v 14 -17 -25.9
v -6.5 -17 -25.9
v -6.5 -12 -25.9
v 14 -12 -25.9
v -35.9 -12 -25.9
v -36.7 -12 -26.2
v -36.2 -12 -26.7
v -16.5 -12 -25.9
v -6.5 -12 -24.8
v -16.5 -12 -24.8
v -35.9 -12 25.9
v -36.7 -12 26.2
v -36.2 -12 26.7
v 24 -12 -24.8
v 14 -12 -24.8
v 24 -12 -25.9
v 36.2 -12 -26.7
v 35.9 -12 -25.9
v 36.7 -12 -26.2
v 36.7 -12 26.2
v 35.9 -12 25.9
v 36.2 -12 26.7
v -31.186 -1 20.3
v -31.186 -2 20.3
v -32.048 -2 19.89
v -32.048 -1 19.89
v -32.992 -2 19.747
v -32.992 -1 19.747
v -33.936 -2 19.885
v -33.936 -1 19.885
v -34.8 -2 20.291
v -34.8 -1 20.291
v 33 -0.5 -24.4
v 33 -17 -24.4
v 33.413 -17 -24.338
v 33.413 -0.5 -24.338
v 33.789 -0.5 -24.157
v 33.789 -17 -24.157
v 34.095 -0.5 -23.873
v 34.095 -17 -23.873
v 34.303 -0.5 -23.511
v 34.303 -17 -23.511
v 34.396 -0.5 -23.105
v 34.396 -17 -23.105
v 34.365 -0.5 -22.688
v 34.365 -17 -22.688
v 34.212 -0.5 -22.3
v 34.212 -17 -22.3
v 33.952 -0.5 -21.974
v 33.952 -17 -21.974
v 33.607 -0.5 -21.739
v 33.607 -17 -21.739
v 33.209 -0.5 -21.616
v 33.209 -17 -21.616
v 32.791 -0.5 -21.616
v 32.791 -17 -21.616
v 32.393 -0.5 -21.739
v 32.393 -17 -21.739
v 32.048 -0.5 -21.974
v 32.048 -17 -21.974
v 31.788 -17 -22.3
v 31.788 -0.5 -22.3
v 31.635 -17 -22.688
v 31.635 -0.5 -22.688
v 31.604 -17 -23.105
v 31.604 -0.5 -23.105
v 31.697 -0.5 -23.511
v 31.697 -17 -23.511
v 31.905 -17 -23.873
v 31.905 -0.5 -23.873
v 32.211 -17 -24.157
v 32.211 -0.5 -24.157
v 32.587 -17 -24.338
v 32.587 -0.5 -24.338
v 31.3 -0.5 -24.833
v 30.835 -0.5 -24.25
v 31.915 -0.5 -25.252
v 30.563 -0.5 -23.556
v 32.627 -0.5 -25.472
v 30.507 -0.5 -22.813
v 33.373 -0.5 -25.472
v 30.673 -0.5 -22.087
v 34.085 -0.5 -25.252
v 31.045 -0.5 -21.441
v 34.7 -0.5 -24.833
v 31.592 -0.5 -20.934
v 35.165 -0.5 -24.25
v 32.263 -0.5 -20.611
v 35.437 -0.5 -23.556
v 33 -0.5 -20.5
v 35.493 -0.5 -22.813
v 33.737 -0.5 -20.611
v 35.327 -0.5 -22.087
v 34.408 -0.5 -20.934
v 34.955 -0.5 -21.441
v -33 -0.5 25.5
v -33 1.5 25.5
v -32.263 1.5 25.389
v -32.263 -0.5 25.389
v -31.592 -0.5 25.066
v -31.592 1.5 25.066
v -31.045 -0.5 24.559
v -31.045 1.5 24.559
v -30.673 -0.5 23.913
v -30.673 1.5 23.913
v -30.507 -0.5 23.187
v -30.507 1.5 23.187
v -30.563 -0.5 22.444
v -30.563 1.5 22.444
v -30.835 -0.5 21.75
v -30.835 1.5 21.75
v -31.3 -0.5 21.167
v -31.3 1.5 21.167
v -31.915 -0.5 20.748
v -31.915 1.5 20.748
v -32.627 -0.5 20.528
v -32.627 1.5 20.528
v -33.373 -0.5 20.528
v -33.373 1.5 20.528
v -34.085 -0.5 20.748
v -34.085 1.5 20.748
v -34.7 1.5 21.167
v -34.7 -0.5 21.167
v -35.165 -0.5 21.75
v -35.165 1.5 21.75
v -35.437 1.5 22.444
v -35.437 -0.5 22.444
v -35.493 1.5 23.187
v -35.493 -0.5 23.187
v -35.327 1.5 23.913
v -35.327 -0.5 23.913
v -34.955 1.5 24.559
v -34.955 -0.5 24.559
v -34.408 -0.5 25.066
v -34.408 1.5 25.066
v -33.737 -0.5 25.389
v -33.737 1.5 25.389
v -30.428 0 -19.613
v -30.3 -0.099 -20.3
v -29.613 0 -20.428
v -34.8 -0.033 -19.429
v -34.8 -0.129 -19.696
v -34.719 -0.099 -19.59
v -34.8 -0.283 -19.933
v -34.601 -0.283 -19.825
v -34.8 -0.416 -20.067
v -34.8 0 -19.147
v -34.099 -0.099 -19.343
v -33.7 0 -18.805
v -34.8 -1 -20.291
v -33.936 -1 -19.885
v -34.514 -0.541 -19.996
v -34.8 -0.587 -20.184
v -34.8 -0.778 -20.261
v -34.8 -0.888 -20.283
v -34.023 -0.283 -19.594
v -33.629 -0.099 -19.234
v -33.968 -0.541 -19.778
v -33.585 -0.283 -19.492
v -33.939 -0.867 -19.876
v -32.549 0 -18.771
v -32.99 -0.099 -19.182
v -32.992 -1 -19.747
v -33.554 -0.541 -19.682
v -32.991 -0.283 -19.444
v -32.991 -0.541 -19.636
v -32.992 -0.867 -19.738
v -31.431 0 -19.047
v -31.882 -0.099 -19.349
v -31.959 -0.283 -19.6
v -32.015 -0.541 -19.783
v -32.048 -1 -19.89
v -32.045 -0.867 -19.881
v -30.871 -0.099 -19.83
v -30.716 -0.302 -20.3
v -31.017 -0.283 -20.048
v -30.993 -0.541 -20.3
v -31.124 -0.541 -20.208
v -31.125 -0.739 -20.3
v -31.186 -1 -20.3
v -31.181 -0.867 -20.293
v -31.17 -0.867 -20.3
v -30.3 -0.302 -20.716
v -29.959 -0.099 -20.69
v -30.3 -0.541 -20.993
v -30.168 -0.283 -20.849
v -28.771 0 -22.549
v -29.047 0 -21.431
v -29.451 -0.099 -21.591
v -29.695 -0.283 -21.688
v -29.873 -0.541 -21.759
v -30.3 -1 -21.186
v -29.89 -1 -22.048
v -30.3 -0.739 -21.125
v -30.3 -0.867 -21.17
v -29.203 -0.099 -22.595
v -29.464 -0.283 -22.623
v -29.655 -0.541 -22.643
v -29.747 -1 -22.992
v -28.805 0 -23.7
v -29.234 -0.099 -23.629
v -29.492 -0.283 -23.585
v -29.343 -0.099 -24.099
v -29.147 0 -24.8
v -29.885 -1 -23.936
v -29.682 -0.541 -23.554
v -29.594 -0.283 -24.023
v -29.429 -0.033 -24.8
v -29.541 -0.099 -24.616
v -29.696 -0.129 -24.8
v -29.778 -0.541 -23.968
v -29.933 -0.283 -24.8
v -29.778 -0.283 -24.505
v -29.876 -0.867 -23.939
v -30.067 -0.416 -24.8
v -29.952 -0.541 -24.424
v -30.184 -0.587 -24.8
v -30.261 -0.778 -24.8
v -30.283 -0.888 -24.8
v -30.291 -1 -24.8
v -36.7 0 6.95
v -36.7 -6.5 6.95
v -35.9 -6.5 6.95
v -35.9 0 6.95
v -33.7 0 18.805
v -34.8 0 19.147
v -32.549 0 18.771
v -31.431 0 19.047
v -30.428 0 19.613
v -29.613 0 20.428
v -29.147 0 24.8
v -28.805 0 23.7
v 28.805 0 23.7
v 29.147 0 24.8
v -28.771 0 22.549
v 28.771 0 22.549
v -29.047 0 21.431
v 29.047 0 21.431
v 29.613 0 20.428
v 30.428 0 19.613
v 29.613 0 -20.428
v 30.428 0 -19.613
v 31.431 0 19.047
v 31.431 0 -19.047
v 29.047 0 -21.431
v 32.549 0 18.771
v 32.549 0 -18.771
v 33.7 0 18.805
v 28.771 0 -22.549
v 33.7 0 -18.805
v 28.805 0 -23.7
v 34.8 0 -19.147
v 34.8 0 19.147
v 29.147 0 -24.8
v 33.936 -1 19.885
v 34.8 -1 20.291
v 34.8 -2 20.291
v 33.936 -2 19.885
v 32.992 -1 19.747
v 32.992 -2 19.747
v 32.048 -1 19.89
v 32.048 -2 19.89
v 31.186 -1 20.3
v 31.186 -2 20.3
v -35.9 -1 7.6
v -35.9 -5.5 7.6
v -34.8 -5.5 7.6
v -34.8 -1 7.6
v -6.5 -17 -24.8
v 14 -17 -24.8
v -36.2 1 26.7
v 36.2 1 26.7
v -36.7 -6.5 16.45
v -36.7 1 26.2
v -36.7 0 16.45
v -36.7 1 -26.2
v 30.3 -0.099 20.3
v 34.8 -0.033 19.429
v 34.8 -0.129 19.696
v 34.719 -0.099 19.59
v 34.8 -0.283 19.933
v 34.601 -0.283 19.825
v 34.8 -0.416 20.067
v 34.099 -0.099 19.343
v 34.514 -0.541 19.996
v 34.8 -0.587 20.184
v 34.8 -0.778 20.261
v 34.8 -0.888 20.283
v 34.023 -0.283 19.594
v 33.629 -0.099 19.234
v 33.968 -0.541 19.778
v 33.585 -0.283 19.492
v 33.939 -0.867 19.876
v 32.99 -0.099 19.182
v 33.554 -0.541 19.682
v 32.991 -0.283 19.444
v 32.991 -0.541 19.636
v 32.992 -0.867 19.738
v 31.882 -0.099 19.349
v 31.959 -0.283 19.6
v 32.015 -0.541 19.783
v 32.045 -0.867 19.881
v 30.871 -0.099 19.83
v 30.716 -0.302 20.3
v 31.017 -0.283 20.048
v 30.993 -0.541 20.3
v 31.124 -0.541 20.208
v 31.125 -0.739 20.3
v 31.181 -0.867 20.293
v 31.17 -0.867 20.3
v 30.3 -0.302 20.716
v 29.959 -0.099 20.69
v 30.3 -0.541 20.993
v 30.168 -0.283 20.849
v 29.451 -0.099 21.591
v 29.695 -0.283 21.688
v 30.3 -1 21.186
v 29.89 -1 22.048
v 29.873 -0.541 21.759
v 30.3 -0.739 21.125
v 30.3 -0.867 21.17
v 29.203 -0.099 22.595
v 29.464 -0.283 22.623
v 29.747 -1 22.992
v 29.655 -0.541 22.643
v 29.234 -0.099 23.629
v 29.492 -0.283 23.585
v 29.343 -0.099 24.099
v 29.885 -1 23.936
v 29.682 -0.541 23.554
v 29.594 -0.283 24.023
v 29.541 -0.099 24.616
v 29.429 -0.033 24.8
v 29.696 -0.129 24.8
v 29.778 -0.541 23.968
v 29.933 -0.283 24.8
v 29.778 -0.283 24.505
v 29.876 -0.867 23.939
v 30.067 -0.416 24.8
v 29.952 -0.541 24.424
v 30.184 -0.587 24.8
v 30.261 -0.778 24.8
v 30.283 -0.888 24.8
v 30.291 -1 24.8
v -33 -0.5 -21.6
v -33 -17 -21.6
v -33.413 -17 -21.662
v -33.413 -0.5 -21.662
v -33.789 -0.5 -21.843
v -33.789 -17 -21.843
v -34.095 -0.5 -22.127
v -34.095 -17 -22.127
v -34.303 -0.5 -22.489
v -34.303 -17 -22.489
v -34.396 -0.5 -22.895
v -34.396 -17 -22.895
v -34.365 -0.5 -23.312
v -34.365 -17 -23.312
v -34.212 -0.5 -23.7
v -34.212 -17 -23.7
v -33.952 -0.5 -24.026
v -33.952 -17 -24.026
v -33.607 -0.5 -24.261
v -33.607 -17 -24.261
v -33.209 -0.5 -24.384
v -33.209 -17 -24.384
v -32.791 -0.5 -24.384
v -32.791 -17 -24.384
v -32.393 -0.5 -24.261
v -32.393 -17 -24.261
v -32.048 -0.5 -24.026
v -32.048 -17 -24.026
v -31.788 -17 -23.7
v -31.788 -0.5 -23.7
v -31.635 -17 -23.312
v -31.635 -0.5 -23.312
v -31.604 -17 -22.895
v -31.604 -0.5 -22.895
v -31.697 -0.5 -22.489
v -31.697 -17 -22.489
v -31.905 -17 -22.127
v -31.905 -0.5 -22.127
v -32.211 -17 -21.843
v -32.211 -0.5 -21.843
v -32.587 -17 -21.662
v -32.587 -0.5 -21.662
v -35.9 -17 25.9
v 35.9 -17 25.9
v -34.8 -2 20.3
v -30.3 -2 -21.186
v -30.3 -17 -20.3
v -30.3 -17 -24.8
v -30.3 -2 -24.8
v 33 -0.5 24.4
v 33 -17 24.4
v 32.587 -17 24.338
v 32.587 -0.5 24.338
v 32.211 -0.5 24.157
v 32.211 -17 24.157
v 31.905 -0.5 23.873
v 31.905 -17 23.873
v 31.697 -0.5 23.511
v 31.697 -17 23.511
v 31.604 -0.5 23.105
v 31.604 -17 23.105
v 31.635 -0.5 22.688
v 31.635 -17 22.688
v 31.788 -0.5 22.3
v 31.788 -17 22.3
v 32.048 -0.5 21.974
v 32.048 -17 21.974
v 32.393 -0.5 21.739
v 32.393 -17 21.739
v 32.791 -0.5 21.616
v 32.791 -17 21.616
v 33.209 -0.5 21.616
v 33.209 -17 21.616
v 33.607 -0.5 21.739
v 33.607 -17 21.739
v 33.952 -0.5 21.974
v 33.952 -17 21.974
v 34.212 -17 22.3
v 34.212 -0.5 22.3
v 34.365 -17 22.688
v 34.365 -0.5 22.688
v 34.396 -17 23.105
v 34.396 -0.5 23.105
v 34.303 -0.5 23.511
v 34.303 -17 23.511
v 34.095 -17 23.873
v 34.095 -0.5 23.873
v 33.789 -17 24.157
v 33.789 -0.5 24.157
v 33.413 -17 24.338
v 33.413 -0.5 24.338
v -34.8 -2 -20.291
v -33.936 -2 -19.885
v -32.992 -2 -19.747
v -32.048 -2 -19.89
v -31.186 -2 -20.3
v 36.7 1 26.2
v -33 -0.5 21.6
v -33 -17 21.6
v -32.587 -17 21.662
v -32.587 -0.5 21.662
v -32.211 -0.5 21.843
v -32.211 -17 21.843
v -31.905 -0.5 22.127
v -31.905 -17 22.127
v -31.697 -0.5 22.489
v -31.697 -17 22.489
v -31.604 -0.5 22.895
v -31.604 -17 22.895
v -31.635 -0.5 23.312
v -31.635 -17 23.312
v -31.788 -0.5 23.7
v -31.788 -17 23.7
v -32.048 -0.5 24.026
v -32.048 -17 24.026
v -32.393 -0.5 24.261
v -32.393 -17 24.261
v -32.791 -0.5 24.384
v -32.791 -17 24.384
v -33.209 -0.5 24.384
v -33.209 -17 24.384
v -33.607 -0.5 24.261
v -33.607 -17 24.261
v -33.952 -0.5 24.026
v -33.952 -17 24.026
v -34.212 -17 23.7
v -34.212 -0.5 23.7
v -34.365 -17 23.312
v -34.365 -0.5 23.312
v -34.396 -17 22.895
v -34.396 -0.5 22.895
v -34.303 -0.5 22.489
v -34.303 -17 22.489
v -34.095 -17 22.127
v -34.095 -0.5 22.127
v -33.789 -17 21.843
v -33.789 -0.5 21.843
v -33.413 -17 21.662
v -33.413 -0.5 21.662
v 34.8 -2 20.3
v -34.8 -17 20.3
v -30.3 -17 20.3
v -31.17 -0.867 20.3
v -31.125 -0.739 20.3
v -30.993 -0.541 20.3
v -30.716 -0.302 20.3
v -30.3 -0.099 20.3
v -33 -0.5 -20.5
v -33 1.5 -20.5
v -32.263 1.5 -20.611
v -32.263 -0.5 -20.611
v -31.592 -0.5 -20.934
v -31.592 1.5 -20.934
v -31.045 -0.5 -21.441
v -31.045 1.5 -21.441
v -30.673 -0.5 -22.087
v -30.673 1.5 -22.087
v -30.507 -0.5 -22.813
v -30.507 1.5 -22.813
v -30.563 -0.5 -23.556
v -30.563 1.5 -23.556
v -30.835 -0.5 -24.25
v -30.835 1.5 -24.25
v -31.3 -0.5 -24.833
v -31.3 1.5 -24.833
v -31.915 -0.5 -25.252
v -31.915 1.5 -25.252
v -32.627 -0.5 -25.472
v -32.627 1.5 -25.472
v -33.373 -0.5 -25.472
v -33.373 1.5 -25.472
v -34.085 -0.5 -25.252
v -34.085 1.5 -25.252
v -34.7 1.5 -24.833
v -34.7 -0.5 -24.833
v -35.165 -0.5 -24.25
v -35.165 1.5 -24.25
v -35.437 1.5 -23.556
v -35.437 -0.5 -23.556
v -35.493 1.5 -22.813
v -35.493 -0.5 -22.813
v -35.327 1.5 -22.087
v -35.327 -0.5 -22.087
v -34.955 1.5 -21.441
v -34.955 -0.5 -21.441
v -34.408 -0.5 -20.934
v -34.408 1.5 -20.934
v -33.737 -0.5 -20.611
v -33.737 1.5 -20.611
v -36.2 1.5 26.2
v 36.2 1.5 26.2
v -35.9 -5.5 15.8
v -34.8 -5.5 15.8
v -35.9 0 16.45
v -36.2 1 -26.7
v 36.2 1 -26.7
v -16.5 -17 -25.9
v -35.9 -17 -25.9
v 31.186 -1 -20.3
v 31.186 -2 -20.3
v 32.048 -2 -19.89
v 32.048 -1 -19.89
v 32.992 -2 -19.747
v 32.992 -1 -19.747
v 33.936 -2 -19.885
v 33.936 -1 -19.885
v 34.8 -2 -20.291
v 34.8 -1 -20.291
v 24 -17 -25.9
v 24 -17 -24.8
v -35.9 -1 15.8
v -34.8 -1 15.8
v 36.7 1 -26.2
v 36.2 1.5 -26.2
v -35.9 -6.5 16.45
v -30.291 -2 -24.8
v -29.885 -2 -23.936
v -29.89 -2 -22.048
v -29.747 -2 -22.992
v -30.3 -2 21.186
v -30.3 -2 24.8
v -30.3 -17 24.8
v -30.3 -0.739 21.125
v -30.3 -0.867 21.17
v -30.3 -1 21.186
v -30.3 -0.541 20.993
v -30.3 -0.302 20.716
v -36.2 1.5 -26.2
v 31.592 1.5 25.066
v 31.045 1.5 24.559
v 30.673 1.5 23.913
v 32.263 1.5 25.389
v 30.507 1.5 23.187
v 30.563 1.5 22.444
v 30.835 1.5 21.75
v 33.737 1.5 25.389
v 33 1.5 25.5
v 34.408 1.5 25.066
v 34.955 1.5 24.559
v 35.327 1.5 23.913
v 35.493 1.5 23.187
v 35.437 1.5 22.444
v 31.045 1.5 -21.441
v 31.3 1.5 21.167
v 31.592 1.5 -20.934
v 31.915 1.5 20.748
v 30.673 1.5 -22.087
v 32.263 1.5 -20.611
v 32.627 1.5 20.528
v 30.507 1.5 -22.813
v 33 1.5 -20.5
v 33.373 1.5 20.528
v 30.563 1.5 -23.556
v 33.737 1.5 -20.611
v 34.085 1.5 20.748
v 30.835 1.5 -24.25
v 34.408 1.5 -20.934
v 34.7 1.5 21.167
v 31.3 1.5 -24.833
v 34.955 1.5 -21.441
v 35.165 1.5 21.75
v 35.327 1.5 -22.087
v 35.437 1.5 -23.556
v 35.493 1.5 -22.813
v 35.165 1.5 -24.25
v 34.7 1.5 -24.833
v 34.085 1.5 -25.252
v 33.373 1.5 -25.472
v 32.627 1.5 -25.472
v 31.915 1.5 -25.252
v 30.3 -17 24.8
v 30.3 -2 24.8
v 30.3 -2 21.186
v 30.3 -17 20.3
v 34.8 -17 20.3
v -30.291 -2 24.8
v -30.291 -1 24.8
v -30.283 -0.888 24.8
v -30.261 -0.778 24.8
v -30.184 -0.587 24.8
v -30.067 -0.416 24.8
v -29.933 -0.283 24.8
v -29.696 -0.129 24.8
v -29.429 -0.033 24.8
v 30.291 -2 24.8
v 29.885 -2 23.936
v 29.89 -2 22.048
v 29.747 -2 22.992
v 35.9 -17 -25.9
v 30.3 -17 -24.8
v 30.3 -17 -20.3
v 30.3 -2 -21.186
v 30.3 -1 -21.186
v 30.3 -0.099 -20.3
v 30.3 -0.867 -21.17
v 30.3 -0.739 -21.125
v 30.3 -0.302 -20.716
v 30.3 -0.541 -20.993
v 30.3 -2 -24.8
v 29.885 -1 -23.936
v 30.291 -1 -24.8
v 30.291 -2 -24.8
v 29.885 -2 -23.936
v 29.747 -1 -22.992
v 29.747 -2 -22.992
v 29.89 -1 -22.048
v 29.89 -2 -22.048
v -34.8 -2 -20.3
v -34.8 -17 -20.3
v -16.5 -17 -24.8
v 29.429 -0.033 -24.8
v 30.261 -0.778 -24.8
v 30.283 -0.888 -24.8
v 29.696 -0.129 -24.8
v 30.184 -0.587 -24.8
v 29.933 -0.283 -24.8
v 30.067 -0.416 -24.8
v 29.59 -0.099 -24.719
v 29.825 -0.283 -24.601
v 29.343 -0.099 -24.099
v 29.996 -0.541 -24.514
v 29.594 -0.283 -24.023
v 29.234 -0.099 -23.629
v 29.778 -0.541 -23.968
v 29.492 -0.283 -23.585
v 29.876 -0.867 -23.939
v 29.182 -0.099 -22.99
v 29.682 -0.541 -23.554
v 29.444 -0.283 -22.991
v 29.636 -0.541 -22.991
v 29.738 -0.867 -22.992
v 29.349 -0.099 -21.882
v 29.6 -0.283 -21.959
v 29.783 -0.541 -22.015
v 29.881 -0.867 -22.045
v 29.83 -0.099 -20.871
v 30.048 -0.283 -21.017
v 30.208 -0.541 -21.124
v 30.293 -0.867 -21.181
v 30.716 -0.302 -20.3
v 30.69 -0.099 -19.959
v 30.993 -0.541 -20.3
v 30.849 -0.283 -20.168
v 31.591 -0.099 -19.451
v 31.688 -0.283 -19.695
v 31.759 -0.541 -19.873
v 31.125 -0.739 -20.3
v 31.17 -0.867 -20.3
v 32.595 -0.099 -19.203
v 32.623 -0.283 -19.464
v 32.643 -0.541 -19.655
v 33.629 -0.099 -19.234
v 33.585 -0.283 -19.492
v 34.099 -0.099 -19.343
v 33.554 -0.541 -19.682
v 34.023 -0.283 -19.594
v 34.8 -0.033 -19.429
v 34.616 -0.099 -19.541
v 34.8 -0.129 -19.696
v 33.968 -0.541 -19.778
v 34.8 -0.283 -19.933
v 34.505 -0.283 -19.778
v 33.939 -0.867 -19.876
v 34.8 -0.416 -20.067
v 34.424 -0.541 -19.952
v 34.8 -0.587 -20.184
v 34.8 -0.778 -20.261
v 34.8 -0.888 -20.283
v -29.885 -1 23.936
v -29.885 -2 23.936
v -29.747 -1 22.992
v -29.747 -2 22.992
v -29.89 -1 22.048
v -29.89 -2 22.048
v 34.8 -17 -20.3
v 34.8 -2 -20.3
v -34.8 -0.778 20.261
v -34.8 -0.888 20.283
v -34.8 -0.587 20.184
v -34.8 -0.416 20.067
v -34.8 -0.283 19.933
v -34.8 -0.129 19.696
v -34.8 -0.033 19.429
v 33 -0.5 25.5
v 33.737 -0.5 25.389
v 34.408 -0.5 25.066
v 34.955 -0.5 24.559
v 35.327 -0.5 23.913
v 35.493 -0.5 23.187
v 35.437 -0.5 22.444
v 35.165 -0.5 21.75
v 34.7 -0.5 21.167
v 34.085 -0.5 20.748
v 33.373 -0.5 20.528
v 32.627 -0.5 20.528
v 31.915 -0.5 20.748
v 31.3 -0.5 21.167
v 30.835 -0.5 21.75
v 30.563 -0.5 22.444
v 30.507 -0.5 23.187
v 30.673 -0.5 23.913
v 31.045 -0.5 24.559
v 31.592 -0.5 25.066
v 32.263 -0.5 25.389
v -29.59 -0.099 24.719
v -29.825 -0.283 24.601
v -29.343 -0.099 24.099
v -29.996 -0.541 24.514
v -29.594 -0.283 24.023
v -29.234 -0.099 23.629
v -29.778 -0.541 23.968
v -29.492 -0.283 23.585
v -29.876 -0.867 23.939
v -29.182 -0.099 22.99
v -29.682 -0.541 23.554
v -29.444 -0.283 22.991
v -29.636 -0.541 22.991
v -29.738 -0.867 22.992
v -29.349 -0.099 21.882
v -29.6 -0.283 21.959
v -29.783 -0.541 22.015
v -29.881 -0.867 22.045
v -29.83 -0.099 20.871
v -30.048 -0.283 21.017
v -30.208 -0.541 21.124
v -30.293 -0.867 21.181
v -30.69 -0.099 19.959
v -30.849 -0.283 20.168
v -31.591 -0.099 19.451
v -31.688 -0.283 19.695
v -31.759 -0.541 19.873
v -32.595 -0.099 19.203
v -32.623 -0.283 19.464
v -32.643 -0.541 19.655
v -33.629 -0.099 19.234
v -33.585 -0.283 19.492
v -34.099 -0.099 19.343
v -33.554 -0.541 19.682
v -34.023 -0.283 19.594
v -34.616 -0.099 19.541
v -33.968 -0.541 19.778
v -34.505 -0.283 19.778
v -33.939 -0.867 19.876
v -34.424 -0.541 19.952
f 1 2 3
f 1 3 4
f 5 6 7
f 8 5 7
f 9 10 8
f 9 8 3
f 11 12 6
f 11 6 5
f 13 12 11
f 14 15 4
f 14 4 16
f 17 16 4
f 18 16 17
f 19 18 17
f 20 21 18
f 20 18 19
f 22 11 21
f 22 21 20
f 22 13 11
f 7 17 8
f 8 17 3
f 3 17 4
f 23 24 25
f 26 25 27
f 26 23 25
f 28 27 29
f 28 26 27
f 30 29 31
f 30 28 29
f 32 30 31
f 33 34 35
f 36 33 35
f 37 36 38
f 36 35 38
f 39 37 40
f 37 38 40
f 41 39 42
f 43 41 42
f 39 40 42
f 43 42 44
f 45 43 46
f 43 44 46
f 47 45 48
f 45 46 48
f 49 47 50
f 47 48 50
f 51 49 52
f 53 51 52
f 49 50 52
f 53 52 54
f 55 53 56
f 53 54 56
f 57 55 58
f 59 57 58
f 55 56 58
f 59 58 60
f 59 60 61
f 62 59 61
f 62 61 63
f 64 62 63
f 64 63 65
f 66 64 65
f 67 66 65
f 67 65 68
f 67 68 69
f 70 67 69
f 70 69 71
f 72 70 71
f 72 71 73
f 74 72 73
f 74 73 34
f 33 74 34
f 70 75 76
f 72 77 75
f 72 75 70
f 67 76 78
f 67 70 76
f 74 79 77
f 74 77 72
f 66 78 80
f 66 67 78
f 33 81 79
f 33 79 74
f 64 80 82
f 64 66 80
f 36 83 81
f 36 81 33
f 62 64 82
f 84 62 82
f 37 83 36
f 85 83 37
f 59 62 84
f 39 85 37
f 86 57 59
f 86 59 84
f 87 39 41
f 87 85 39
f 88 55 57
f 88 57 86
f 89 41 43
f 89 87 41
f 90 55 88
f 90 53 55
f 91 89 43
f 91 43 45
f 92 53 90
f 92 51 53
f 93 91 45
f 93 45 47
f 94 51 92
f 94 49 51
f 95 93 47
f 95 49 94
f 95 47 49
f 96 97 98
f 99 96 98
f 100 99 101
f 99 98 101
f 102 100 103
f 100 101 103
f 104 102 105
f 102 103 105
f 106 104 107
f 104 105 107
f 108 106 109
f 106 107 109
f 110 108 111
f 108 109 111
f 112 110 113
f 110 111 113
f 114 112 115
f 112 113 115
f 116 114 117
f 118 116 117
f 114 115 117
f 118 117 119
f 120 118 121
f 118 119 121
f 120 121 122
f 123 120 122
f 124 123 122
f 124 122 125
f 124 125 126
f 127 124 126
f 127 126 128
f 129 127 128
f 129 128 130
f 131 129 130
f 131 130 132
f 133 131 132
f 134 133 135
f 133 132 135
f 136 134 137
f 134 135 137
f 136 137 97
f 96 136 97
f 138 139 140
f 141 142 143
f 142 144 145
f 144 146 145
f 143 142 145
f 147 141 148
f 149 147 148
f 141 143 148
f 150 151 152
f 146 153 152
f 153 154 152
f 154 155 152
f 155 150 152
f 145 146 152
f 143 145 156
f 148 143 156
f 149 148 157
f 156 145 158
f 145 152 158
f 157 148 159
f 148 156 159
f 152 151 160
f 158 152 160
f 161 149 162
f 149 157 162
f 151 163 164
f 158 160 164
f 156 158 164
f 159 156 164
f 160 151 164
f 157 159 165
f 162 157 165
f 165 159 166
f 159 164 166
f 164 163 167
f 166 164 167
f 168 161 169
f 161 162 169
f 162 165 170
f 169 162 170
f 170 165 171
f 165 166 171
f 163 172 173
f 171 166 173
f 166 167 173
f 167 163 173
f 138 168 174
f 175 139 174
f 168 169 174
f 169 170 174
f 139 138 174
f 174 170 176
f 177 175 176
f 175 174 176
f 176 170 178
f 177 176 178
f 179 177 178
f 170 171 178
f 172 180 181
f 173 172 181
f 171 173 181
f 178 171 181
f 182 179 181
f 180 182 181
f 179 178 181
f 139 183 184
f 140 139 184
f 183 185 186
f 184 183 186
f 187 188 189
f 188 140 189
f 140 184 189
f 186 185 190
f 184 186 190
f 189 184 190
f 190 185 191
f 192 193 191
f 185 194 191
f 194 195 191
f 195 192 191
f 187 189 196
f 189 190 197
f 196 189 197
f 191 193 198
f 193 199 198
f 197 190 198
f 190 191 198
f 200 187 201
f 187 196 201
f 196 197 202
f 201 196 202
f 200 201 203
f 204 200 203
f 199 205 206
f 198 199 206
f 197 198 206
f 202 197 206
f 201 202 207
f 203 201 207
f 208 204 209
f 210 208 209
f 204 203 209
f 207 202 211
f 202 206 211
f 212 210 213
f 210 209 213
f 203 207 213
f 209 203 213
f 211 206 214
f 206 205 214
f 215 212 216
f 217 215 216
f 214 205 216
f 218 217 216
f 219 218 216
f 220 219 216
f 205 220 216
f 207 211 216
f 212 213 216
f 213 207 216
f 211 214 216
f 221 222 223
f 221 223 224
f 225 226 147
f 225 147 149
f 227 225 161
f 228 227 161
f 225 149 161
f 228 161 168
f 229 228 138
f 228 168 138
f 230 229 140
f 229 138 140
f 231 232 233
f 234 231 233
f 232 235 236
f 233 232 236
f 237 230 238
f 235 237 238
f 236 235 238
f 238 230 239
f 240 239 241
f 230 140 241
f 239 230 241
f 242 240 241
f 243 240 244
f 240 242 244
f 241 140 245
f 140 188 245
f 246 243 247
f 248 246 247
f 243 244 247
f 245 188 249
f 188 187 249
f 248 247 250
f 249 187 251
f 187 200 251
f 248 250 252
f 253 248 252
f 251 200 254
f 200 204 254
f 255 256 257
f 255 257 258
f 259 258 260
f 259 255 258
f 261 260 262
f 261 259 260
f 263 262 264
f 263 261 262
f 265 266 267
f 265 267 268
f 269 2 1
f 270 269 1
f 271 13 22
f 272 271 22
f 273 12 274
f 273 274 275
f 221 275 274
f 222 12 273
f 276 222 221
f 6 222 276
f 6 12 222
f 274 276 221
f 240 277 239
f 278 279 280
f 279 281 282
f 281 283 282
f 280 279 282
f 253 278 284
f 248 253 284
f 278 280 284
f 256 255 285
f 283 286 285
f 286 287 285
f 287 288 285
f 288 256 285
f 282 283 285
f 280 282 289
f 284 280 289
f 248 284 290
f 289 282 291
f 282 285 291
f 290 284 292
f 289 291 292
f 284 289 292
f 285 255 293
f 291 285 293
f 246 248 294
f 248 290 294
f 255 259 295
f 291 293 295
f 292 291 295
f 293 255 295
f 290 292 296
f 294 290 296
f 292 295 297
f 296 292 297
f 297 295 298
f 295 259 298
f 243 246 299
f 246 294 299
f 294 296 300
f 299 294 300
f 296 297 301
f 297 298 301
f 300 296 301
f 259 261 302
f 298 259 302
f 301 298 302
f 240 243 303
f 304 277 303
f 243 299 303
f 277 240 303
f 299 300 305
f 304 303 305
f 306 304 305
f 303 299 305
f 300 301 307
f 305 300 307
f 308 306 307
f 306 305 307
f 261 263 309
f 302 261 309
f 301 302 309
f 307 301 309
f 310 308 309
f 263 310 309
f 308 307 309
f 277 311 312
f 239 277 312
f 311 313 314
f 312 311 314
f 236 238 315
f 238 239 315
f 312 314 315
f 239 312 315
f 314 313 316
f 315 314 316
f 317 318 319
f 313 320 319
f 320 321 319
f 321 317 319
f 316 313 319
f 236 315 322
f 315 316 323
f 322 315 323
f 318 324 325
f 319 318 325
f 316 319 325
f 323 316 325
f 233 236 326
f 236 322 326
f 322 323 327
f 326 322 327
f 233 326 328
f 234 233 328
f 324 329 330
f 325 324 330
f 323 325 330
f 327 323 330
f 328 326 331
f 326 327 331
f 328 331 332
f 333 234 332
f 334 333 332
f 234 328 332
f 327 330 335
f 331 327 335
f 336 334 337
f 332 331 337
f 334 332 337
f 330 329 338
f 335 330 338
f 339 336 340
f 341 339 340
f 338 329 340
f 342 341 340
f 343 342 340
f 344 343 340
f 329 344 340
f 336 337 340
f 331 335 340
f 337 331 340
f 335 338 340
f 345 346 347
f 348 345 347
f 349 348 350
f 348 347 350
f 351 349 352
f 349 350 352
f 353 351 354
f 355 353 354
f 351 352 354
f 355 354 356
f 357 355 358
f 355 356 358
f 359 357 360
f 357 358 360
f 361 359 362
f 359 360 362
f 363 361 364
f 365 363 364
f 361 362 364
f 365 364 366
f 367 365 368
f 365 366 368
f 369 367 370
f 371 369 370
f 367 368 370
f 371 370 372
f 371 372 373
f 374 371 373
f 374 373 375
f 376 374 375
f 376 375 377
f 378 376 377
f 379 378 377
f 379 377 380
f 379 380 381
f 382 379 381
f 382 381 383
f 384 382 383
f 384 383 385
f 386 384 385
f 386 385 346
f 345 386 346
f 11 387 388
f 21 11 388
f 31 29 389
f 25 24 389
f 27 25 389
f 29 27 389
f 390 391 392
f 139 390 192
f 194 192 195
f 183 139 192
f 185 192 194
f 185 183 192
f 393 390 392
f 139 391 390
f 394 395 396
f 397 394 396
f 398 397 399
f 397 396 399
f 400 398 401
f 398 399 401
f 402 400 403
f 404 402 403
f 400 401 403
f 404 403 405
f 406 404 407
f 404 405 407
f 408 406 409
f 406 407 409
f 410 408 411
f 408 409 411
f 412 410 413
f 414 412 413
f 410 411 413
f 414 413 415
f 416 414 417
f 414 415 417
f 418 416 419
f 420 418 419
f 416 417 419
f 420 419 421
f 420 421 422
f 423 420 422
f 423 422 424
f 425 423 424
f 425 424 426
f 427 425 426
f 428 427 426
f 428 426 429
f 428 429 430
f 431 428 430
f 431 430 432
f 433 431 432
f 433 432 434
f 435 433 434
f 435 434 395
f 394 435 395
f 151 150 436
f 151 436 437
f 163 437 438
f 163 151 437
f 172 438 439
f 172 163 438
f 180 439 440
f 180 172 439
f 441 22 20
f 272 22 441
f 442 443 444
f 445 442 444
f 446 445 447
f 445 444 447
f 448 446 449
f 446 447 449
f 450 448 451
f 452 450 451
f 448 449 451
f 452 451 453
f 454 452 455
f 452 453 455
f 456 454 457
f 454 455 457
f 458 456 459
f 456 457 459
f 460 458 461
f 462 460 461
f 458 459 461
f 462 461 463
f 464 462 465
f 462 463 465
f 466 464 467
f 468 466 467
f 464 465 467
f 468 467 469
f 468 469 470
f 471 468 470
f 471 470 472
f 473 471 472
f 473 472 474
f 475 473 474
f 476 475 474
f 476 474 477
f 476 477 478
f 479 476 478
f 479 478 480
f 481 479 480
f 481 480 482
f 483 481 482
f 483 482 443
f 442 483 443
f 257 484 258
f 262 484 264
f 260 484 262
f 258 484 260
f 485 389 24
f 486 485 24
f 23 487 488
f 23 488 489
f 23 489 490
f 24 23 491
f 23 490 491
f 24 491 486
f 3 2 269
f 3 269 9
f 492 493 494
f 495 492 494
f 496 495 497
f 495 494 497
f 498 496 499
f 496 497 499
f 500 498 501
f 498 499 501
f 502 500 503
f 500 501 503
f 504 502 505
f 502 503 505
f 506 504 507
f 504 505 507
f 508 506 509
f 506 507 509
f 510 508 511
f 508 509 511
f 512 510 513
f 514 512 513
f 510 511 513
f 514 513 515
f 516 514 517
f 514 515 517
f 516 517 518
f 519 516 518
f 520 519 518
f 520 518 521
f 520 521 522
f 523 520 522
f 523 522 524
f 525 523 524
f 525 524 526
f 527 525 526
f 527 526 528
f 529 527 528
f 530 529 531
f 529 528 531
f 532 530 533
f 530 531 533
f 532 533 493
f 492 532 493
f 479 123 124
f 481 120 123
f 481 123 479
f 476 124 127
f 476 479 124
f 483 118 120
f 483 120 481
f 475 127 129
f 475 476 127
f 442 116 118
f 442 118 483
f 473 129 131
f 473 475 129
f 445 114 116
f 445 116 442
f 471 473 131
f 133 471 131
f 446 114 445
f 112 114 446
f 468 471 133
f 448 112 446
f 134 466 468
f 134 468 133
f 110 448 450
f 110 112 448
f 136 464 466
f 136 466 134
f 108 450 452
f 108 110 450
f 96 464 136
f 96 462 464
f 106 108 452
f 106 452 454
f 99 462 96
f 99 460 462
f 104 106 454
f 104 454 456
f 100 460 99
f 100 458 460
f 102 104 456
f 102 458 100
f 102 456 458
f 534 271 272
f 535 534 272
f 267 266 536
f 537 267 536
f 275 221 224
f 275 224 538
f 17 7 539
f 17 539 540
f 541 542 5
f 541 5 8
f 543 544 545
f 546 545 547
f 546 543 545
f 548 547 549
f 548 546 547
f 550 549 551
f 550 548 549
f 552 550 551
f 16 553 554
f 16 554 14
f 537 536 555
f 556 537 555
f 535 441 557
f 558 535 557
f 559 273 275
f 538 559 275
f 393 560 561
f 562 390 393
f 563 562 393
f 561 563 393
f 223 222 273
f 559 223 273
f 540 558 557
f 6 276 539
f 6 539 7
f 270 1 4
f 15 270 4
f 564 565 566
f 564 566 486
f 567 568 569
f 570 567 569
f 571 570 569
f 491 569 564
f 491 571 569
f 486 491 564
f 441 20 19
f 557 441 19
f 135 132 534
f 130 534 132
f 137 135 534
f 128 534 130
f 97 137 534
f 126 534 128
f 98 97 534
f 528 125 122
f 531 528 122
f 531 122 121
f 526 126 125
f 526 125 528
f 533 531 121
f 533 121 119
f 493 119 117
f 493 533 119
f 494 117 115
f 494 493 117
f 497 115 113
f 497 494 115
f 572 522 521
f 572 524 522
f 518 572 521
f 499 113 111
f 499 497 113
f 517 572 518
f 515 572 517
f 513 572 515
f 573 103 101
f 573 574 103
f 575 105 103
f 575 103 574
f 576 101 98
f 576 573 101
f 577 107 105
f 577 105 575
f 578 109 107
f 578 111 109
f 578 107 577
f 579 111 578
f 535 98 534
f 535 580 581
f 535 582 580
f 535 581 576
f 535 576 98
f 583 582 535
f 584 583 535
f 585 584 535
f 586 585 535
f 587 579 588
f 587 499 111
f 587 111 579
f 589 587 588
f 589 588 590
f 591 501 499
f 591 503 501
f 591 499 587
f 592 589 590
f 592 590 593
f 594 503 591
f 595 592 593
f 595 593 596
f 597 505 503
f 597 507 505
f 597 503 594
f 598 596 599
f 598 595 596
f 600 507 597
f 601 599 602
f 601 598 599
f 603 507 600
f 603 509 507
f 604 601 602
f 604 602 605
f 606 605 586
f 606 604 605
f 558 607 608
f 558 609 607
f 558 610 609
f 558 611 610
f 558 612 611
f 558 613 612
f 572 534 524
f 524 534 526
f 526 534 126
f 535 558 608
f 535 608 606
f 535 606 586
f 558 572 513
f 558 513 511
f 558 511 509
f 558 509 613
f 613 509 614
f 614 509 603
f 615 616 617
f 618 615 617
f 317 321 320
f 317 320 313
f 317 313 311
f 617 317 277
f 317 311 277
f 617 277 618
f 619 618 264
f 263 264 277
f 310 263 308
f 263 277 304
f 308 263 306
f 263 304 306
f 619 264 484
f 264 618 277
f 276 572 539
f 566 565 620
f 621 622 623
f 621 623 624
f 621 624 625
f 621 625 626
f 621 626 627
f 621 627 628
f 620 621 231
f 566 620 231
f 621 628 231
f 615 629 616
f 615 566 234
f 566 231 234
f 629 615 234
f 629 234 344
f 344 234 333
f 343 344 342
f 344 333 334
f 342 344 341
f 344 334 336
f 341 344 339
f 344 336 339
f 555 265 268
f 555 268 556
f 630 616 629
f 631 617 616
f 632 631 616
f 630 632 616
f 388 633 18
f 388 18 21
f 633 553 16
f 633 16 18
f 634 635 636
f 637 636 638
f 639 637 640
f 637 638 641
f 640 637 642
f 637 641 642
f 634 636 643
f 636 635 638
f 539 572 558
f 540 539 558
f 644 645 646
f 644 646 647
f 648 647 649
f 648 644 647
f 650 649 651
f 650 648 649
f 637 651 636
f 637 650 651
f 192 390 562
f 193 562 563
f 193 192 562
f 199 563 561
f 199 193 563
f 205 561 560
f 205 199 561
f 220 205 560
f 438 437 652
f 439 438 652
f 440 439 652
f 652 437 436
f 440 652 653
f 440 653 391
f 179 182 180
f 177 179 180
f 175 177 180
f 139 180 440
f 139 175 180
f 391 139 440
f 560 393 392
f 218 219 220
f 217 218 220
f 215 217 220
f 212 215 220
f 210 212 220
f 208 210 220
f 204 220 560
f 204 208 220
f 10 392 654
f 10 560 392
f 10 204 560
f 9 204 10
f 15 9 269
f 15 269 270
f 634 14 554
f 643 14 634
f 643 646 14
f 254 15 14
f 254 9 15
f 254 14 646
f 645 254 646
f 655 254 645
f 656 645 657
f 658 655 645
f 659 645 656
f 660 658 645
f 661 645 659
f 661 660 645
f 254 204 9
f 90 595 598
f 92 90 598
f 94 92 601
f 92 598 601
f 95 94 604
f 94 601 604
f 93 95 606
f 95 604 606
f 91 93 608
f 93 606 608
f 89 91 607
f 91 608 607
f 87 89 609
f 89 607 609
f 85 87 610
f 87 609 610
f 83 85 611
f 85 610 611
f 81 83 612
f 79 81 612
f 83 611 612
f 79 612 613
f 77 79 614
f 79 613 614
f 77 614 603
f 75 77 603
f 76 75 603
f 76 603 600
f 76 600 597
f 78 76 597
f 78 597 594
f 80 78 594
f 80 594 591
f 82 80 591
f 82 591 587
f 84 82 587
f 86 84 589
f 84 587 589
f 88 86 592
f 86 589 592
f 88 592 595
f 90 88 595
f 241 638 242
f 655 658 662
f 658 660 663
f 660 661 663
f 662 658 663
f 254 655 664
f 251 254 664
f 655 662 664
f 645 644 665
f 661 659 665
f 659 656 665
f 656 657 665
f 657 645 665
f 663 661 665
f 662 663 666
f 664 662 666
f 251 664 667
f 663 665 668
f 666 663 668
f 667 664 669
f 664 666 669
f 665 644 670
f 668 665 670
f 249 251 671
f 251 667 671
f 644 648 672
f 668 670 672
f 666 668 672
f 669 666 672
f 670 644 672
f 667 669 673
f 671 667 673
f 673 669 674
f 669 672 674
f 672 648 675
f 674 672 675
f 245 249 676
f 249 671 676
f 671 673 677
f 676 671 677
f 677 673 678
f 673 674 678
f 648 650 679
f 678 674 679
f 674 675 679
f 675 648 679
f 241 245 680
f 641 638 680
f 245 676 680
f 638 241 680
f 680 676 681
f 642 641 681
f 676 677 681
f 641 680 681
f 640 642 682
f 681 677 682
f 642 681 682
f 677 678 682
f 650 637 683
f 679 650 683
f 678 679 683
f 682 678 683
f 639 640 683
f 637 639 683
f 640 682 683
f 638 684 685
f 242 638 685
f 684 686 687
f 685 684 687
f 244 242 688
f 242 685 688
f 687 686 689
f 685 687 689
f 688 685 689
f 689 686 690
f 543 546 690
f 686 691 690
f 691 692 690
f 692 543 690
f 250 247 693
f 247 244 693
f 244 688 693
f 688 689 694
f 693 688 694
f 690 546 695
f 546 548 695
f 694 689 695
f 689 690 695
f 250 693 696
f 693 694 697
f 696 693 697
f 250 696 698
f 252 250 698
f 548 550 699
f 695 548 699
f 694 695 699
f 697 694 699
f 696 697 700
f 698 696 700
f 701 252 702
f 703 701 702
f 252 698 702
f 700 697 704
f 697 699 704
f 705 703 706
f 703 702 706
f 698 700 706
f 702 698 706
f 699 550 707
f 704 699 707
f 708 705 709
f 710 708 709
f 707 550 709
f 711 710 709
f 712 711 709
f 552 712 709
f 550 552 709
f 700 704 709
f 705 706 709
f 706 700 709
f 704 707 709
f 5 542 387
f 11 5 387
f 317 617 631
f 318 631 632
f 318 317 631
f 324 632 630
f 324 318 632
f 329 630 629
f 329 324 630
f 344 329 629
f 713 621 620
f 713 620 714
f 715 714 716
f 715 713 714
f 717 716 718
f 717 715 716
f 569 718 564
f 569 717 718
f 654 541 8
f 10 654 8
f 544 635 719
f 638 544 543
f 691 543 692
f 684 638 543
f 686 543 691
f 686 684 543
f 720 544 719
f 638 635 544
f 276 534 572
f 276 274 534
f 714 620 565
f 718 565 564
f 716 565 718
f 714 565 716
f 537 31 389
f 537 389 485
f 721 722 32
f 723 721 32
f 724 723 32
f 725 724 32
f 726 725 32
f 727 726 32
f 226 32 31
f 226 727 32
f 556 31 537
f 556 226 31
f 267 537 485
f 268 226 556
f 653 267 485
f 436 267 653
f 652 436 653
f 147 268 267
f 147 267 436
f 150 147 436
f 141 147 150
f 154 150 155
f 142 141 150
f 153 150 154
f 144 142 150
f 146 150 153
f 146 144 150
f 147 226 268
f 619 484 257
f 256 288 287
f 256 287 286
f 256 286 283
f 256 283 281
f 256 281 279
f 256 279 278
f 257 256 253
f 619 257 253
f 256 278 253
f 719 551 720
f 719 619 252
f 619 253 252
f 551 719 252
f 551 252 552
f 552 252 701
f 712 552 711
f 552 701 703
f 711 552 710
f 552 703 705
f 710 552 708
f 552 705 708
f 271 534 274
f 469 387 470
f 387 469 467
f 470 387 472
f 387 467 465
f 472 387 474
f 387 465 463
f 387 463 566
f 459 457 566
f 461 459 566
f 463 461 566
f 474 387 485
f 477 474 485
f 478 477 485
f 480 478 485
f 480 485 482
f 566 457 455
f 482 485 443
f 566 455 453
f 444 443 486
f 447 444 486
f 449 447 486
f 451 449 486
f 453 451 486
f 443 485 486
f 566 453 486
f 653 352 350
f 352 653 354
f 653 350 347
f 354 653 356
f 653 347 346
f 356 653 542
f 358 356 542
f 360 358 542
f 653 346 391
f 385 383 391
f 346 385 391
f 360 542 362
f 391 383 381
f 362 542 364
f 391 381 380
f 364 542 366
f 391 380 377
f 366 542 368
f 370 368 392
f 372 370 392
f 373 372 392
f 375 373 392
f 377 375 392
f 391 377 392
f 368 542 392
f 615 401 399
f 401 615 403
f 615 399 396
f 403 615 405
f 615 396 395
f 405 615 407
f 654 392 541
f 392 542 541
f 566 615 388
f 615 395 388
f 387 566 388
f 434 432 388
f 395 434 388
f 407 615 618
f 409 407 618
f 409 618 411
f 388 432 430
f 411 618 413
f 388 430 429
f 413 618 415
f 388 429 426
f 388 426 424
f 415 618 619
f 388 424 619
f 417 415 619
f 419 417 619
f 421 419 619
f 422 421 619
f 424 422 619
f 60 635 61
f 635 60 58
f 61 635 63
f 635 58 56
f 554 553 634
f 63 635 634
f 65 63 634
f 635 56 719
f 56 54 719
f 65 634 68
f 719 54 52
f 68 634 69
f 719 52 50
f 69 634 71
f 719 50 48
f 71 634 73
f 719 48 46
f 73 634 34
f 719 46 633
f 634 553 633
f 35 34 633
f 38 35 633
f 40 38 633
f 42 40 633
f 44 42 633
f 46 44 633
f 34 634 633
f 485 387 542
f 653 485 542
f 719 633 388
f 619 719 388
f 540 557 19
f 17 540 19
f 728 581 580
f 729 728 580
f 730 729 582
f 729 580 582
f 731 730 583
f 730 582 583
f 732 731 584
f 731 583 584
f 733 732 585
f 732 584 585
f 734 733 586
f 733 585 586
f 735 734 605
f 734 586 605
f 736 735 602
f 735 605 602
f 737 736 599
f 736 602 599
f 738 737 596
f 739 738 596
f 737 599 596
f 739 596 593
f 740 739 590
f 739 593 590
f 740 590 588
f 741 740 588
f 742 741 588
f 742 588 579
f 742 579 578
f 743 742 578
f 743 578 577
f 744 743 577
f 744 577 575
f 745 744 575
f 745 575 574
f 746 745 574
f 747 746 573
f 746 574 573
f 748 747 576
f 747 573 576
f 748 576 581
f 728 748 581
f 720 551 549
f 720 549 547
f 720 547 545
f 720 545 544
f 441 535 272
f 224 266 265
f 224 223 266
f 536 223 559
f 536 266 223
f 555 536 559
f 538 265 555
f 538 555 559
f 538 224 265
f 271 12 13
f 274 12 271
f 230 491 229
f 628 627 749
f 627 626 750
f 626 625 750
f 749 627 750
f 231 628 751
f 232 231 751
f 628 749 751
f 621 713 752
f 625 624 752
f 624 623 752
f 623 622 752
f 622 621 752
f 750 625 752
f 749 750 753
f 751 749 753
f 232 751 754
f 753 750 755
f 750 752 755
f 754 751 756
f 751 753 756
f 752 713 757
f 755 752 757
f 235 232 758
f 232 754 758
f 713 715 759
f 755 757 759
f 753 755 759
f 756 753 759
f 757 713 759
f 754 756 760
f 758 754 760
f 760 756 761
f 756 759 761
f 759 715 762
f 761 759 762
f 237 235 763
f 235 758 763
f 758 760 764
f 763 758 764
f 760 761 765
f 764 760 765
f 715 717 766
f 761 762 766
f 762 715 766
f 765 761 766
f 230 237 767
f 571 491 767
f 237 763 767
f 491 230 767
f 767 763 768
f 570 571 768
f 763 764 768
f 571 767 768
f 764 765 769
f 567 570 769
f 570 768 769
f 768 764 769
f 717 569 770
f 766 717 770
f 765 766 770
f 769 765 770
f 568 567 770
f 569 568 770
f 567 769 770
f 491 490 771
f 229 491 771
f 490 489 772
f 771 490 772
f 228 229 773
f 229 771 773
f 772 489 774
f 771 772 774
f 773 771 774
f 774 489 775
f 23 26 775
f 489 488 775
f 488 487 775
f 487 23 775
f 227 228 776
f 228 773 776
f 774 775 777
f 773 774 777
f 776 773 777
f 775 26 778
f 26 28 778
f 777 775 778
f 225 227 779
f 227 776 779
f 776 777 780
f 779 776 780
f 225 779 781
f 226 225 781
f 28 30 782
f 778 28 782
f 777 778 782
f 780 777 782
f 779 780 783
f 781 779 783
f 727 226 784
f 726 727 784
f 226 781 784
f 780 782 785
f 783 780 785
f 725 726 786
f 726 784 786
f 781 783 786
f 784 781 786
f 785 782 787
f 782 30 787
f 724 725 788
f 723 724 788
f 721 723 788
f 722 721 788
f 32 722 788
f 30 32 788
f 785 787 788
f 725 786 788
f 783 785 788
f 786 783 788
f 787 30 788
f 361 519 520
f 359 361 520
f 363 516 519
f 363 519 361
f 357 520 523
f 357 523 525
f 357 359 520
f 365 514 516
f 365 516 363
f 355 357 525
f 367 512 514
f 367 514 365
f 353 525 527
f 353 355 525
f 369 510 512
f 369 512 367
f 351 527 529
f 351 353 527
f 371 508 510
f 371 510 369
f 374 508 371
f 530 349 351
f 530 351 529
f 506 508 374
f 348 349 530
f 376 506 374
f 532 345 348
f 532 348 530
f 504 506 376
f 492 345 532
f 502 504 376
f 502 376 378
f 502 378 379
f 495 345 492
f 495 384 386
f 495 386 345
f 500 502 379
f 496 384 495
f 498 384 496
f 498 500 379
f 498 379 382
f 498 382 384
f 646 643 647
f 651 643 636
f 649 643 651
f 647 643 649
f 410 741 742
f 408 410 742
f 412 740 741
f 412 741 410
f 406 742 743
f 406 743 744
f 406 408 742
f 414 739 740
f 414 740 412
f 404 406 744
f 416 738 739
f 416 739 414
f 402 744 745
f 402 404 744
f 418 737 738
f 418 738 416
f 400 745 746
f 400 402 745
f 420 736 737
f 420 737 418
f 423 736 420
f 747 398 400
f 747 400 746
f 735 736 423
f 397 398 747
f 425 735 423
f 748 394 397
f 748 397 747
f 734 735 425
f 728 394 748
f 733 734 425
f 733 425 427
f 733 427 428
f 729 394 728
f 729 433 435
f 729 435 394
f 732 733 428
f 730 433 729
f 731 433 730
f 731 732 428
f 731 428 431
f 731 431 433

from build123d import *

# Parameters (mm, degrees)
SKETCH_1_W           = 73.4
SKETCH_1_H           = 53.4
SKETCH_1_W_2         = 69.6
SKETCH_1_H_2         = 49.6
EXTRUDE_1_DEPTH      = 17
SKETCH_2_W           = 73.4
SKETCH_2_H           = 53.4
EXTRUDE_2_DEPTH      = 1.5
SKETCH_3_W           = 4.5
SKETCH_3_H           = 4.5
EXTRUDE_3_DEPTH      = 17
SKETCH_9_R           = 3.252691193
EXTRUDE_5_DEPTH      = 2
CHAMFER_1_SIZE       = 0.5
SKETCH_6_OUTSIDE_W   = 93.928
SKETCH_6_OUTSIDE_H   = 73.928
SKETCH_6_OUTSIDE_W_2 = 71.8
SKETCH_6_OUTSIDE_H_2 = 51.8
CUT_EXTRUDE_3_DEPTH  = 5
SKETCH_5_R           = 1.4
CUT_EXTRUDE_2_DEPTH  = 50.010509077
CUT_EXTRUDE_4_REACH  = 68.988
SKETCH_7_W           = 10
SKETCH_7_H           = 6.4
SKETCH_8_R           = 2.5
CUT_EXTRUDE_5_DEPTH  = 2
SKETCH_10_W          = 9.5
SKETCH_10_H          = 6.5
CUT_EXTRUDE_6_DEPTH  = 0.8
CUT_EXTRUDE_7_REACH  = 81.2
SKETCH_11_W          = 8.2
SKETCH_11_H          = 4.5
FILLET_1_R           = 1


with BuildPart() as part:
    # Эскиз1 → Бобышка-Вытянуть1 (new body)
    with BuildSketch(Plane(origin=(0, 0, 0), x_dir=(1, 0, 0), z_dir=(0, 1, 0))):
        Rectangle(SKETCH_1_W, SKETCH_1_H)
        Rectangle(SKETCH_1_W_2, SKETCH_1_H_2, mode=Mode.SUBTRACT)
    extrude(amount=-EXTRUDE_1_DEPTH)

    # Эскиз2 → Бобышка-Вытянуть2 (add)
    with BuildSketch(Plane(origin=(0, 0, 0), x_dir=(1, 0, 0), z_dir=(0, 1, 0))):
        Rectangle(SKETCH_2_W, SKETCH_2_H)
    extrude(amount=EXTRUDE_2_DEPTH)

    # Эскиз3 → Бобышка-Вытянуть3 (add, through all)
    with BuildSketch(Plane(origin=(0, 0, 0), x_dir=(1, 0, 0), z_dir=(0, 1, 0))):
        with Locations((-32.55, 22.55)):
            Rectangle(SKETCH_3_W, SKETCH_3_H)
        with Locations((32.55, 22.55)):
            Rectangle(SKETCH_3_W, SKETCH_3_H)
        with Locations((-32.55, -22.55)):
            Rectangle(SKETCH_3_W, SKETCH_3_H)
        with Locations((32.55, -22.55)):
            Rectangle(SKETCH_3_W, SKETCH_3_H)
    extrude(amount=-EXTRUDE_3_DEPTH)

    # Эскиз9 → Бобышка-Вытянуть5 (add)
    with BuildSketch(Plane(origin=(0, 0, 0), x_dir=(-1, 0, 0), z_dir=(0, 1, 0))):
        with Locations((-33, 23)):
            Circle(SKETCH_9_R)
        with Locations((-33, -23)):
            Circle(SKETCH_9_R)
        with Locations((33, -23)):
            Circle(SKETCH_9_R)
        with Locations((33, 23)):
            Circle(SKETCH_9_R)
    extrude(amount=-EXTRUDE_5_DEPTH)

    # Фаска1
    chamfer_1_edges = [part.edges().sort_by_distance(p)[0] for p in [
        (-36.7, 1.5, 0),
        (0, 1.5, 26.7),
        (36.7, 1.5, 0),
        (0, 1.5, -26.7),
        (-36.7, -7.75, -26.7),
        (36.7, -7.75, -26.7),
        (36.7, -7.75, 26.7),
        (-36.7, -7.75, 26.7),
    ]]
    chamfer(chamfer_1_edges, length=CHAMFER_1_SIZE)

    # Эскиз6 outside → Вырез-Вытянуть3 (cut)
    with BuildSketch(Plane.XZ.offset(17)):
        Rectangle(SKETCH_6_OUTSIDE_W, SKETCH_6_OUTSIDE_H)
        Rectangle(SKETCH_6_OUTSIDE_W_2, SKETCH_6_OUTSIDE_H_2, mode=Mode.SUBTRACT)
    extrude(amount=-CUT_EXTRUDE_3_DEPTH, mode=Mode.SUBTRACT)

    # Эскиз5 → Вырез-Вытянуть2 (cut, through all)
    with BuildSketch(Plane.XZ.offset(17)):
        with Locations(Location((-33, 23, 0), (0, 0, 270))):
            Circle(SKETCH_5_R)
        with Locations(Location((33, 23, 0), (0, 0, 90))):
            Circle(SKETCH_5_R)
        with Locations(Location((33, -23, 0), (0, 0, 270))):
            Circle(SKETCH_5_R)
        with Locations(Location((-33, -23, 0), (0, 0, 90))):
            Circle(SKETCH_5_R)
    extrude(amount=-CUT_EXTRUDE_2_DEPTH, mode=Mode.SUBTRACT)

    # Эскиз7 → Вырез-Вытянуть4 (cut, up to next)
    with BuildSketch(Plane(origin=(0, 0, -26.7), x_dir=(-1, 0, 0), z_dir=(0, 0, -1)), mode=Mode.PRIVATE) as cut_extrude_4_sk1:
        with Locations((-19, -15.2)):
            Rectangle(SKETCH_7_W, SKETCH_7_H)
    cut_extrude_4_tool1 = extrude(cut_extrude_4_sk1.sketch, amount=-CUT_EXTRUDE_4_REACH, mode=Mode.PRIVATE) & part.part
    # Эскиз7 → Вырез-Вытянуть4 (cut, up to next)
    with BuildSketch(Plane(origin=(0, 0, -26.7), x_dir=(-1, 0, 0), z_dir=(0, 0, -1)), mode=Mode.PRIVATE) as cut_extrude_4_sk2:
        with Locations((11.5, -15.2)):
            Rectangle(SKETCH_7_W, SKETCH_7_H)
    cut_extrude_4_tool2 = extrude(cut_extrude_4_sk2.sketch, amount=-CUT_EXTRUDE_4_REACH, mode=Mode.PRIVATE) & part.part
    add(cut_extrude_4_tool1.solids().sort_by_distance((19, -15.2, -26.7))[0], mode=Mode.SUBTRACT)
    add(cut_extrude_4_tool2.solids().sort_by_distance((-11.5, -15.2, -26.7))[0], mode=Mode.SUBTRACT)

    # Эскиз8 → Вырез-Вытянуть5 (cut)
    with BuildSketch(Plane(origin=(0, 1.5, 0), x_dir=(1, 0, 0), z_dir=(0, 1, 0))):
        with Locations(Location((-33, 23, 0), (0, 0, 270))):
            Circle(SKETCH_8_R)
        with Locations(Location((33, 23, 0), (0, 0, 270))):
            Circle(SKETCH_8_R)
        with Locations(Location((33, -23, 0), (0, 0, 270))):
            Circle(SKETCH_8_R)
        with Locations(Location((-33, -23, 0), (0, 0, 270))):
            Circle(SKETCH_8_R)
    extrude(amount=-CUT_EXTRUDE_5_DEPTH, mode=Mode.SUBTRACT)

    # Эскиз10 → Вырез-Вытянуть6 (cut)
    with BuildSketch(Plane.ZY.offset(36.7)):
        with Locations((11.7, -3.25)):
            Rectangle(SKETCH_10_W, SKETCH_10_H)
    extrude(amount=-CUT_EXTRUDE_6_DEPTH, mode=Mode.SUBTRACT)

    # Эскиз11 → Вырез-Вытянуть7 (cut, up to next)
    with BuildSketch(Plane.ZY.offset(35.9), mode=Mode.PRIVATE) as cut_extrude_7_sk1:
        with Locations((11.7, -3.25)):
            Rectangle(SKETCH_11_W, SKETCH_11_H)
    cut_extrude_7_tool1 = extrude(cut_extrude_7_sk1.sketch, amount=-CUT_EXTRUDE_7_REACH, mode=Mode.PRIVATE) & part.part
    add(cut_extrude_7_tool1.solids().sort_by_distance((-35.9, -3.25, 11.7))[0], mode=Mode.SUBTRACT)

    # Скругление1
    # the kernel refuses this fillet: 1 mm, written as the material it adds along each edge
    with BuildSketch(Plane(origin=(-33, 0, -23), x_dir=(-0.9768477562841145, 0, 0.21393564696583717), z_dir=(-0.21393564696583717, 0, -0.9768477562841145))) as fillet_1_piece_1_section:
        with BuildLine():
            CenterArc((3.252691193 + FILLET_1_R, -FILLET_1_R), FILLET_1_R, 90, 90)
            Line((3.252691193, -FILLET_1_R), (3.252691193, 0))
            Line((3.252691193, 0), (3.252691193 + FILLET_1_R, 0))
        make_face()
    fillet_1_piece_1 = revolve(axis=Axis((-33, 0, -23), (0, 1, 0)), revolution_arc=155.58691753, mode=Mode.PRIVATE)
    fillet_1_piece_1 = split(fillet_1_piece_1, bisect_by=Plane(origin=(-34.8, -0.215043292, -19.734246257), z_dir=(1, 0, 0)), keep=Keep.TOP, mode=Mode.PRIVATE)
    add(fillet_1_piece_1)
    with BuildSketch(Plane(origin=(-33, 0, -23), x_dir=(0.20893573542178995, 0, 0.9779293729425228), z_dir=(-0.9779293729425228, 0, 0.20893573542178995))) as fillet_1_piece_2_section:
        with BuildLine():
            CenterArc((3.252691193 + FILLET_1_R, -FILLET_1_R), FILLET_1_R, 90, 90)
            Line((3.252691193, -FILLET_1_R), (3.252691193, 0))
            Line((3.252691193, 0), (3.252691193 + FILLET_1_R, 0))
        make_face()
    fillet_1_piece_2 = revolve(axis=Axis((-33, 0, -23), (0, 1, 0)), revolution_arc=155.58691753, mode=Mode.PRIVATE)
    fillet_1_piece_2 = split(fillet_1_piece_2, bisect_by=Plane(origin=(-31.496865792, -0.203453463, -24.8), z_dir=(0, 0, 1)), keep=Keep.TOP, mode=Mode.PRIVATE)
    add(fillet_1_piece_2)
    with BuildSketch(Plane(origin=(-33, 0, 23), x_dir=(0.21393564696585013, 0, 0.9768477562841116), z_dir=(-0.9768477562841116, 0, 0.21393564696585013))) as fillet_1_piece_3_section:
        with BuildLine():
            CenterArc((3.252691193 + FILLET_1_R, -FILLET_1_R), FILLET_1_R, 90, 90)
            Line((3.252691193, -FILLET_1_R), (3.252691193, 0))
            Line((3.252691193, 0), (3.252691193 + FILLET_1_R, 0))
        make_face()
    fillet_1_piece_3 = revolve(axis=Axis((-33, 0, 23), (0, 1, 0)), revolution_arc=155.58691753, mode=Mode.PRIVATE)
    fillet_1_piece_3 = split(fillet_1_piece_3, bisect_by=Plane(origin=(-29.734246201, -0.215043247, 24.8), z_dir=(0, 0, -1)), keep=Keep.TOP, mode=Mode.PRIVATE)
    add(fillet_1_piece_3)
    with BuildSketch(Plane(origin=(-33, 0, 23), x_dir=(0.9779293729425067, 0, -0.20893573542186514), z_dir=(0.20893573542186514, 0, 0.9779293729425067))) as fillet_1_piece_4_section:
        with BuildLine():
            CenterArc((3.252691193 + FILLET_1_R, -FILLET_1_R), FILLET_1_R, 90, 90)
            Line((3.252691193, -FILLET_1_R), (3.252691193, 0))
            Line((3.252691193, 0), (3.252691193 + FILLET_1_R, 0))
        make_face()
    fillet_1_piece_4 = revolve(axis=Axis((-33, 0, 23), (0, 1, 0)), revolution_arc=155.58691753, mode=Mode.PRIVATE)
    fillet_1_piece_4 = split(fillet_1_piece_4, bisect_by=Plane(origin=(-34.8, -0.203453257, 21.496866097), z_dir=(1, 0, 0)), keep=Keep.TOP, mode=Mode.PRIVATE)
    add(fillet_1_piece_4)
    with BuildSketch(Plane(origin=(33, 0, 23), x_dir=(0.9768477562841055, 0, -0.21393564696587863), z_dir=(0.21393564696587863, 0, 0.9768477562841055))) as fillet_1_piece_5_section:
        with BuildLine():
            CenterArc((3.252691193 + FILLET_1_R, -FILLET_1_R), FILLET_1_R, 90, 90)
            Line((3.252691193, -FILLET_1_R), (3.252691193, 0))
            Line((3.252691193, 0), (3.252691193 + FILLET_1_R, 0))
        make_face()
    fillet_1_piece_5 = revolve(axis=Axis((33, 0, 23), (0, 1, 0)), revolution_arc=155.58691753, mode=Mode.PRIVATE)
    fillet_1_piece_5 = split(fillet_1_piece_5, bisect_by=Plane(origin=(34.8, -0.215043292, 19.734246257), z_dir=(-1, 0, 0)), keep=Keep.TOP, mode=Mode.PRIVATE)
    add(fillet_1_piece_5)
    with BuildSketch(Plane(origin=(33, 0, 23), x_dir=(-0.20893573542180963, 0, -0.9779293729425186), z_dir=(0.9779293729425186, 0, -0.20893573542180963))) as fillet_1_piece_6_section:
        with BuildLine():
            CenterArc((3.252691193 + FILLET_1_R, -FILLET_1_R), FILLET_1_R, 90, 90)
            Line((3.252691193, -FILLET_1_R), (3.252691193, 0))
            Line((3.252691193, 0), (3.252691193 + FILLET_1_R, 0))
        make_face()
    fillet_1_piece_6 = revolve(axis=Axis((33, 0, 23), (0, 1, 0)), revolution_arc=155.58691753, mode=Mode.PRIVATE)
    fillet_1_piece_6 = split(fillet_1_piece_6, bisect_by=Plane(origin=(31.496865792, -0.203453463, 24.8), z_dir=(0, 0, -1)), keep=Keep.TOP, mode=Mode.PRIVATE)
    add(fillet_1_piece_6)
    with BuildSketch(Plane(origin=(33, 0, -23), x_dir=(-0.2139356469658719, 0, -0.9768477562841068), z_dir=(0.9768477562841068, 0, -0.2139356469658719))) as fillet_1_piece_7_section:
        with BuildLine():
            CenterArc((3.252691193 + FILLET_1_R, -FILLET_1_R), FILLET_1_R, 90, 90)
            Line((3.252691193, -FILLET_1_R), (3.252691193, 0))
            Line((3.252691193, 0), (3.252691193 + FILLET_1_R, 0))
        make_face()
    fillet_1_piece_7 = revolve(axis=Axis((33, 0, -23), (0, 1, 0)), revolution_arc=155.58691753, mode=Mode.PRIVATE)
    fillet_1_piece_7 = split(fillet_1_piece_7, bisect_by=Plane(origin=(29.734246201, -0.215043247, -24.8), z_dir=(0, 0, 1)), keep=Keep.TOP, mode=Mode.PRIVATE)
    add(fillet_1_piece_7)
    with BuildSketch(Plane(origin=(33, 0, -23), x_dir=(-0.9779293729425086, 0, 0.20893573542185656), z_dir=(-0.20893573542185656, 0, -0.9779293729425086))) as fillet_1_piece_8_section:
        with BuildLine():
            CenterArc((3.252691193 + FILLET_1_R, -FILLET_1_R), FILLET_1_R, 90, 90)
            Line((3.252691193, -FILLET_1_R), (3.252691193, 0))
            Line((3.252691193, 0), (3.252691193 + FILLET_1_R, 0))
        make_face()
    fillet_1_piece_8 = revolve(axis=Axis((33, 0, -23), (0, 1, 0)), revolution_arc=155.58691753, mode=Mode.PRIVATE)
    fillet_1_piece_8 = split(fillet_1_piece_8, bisect_by=Plane(origin=(34.8, -0.203453257, -21.496866097), z_dir=(-1, 0, 0)), keep=Keep.TOP, mode=Mode.PRIVATE)
    add(fillet_1_piece_8)


solid = part.part
